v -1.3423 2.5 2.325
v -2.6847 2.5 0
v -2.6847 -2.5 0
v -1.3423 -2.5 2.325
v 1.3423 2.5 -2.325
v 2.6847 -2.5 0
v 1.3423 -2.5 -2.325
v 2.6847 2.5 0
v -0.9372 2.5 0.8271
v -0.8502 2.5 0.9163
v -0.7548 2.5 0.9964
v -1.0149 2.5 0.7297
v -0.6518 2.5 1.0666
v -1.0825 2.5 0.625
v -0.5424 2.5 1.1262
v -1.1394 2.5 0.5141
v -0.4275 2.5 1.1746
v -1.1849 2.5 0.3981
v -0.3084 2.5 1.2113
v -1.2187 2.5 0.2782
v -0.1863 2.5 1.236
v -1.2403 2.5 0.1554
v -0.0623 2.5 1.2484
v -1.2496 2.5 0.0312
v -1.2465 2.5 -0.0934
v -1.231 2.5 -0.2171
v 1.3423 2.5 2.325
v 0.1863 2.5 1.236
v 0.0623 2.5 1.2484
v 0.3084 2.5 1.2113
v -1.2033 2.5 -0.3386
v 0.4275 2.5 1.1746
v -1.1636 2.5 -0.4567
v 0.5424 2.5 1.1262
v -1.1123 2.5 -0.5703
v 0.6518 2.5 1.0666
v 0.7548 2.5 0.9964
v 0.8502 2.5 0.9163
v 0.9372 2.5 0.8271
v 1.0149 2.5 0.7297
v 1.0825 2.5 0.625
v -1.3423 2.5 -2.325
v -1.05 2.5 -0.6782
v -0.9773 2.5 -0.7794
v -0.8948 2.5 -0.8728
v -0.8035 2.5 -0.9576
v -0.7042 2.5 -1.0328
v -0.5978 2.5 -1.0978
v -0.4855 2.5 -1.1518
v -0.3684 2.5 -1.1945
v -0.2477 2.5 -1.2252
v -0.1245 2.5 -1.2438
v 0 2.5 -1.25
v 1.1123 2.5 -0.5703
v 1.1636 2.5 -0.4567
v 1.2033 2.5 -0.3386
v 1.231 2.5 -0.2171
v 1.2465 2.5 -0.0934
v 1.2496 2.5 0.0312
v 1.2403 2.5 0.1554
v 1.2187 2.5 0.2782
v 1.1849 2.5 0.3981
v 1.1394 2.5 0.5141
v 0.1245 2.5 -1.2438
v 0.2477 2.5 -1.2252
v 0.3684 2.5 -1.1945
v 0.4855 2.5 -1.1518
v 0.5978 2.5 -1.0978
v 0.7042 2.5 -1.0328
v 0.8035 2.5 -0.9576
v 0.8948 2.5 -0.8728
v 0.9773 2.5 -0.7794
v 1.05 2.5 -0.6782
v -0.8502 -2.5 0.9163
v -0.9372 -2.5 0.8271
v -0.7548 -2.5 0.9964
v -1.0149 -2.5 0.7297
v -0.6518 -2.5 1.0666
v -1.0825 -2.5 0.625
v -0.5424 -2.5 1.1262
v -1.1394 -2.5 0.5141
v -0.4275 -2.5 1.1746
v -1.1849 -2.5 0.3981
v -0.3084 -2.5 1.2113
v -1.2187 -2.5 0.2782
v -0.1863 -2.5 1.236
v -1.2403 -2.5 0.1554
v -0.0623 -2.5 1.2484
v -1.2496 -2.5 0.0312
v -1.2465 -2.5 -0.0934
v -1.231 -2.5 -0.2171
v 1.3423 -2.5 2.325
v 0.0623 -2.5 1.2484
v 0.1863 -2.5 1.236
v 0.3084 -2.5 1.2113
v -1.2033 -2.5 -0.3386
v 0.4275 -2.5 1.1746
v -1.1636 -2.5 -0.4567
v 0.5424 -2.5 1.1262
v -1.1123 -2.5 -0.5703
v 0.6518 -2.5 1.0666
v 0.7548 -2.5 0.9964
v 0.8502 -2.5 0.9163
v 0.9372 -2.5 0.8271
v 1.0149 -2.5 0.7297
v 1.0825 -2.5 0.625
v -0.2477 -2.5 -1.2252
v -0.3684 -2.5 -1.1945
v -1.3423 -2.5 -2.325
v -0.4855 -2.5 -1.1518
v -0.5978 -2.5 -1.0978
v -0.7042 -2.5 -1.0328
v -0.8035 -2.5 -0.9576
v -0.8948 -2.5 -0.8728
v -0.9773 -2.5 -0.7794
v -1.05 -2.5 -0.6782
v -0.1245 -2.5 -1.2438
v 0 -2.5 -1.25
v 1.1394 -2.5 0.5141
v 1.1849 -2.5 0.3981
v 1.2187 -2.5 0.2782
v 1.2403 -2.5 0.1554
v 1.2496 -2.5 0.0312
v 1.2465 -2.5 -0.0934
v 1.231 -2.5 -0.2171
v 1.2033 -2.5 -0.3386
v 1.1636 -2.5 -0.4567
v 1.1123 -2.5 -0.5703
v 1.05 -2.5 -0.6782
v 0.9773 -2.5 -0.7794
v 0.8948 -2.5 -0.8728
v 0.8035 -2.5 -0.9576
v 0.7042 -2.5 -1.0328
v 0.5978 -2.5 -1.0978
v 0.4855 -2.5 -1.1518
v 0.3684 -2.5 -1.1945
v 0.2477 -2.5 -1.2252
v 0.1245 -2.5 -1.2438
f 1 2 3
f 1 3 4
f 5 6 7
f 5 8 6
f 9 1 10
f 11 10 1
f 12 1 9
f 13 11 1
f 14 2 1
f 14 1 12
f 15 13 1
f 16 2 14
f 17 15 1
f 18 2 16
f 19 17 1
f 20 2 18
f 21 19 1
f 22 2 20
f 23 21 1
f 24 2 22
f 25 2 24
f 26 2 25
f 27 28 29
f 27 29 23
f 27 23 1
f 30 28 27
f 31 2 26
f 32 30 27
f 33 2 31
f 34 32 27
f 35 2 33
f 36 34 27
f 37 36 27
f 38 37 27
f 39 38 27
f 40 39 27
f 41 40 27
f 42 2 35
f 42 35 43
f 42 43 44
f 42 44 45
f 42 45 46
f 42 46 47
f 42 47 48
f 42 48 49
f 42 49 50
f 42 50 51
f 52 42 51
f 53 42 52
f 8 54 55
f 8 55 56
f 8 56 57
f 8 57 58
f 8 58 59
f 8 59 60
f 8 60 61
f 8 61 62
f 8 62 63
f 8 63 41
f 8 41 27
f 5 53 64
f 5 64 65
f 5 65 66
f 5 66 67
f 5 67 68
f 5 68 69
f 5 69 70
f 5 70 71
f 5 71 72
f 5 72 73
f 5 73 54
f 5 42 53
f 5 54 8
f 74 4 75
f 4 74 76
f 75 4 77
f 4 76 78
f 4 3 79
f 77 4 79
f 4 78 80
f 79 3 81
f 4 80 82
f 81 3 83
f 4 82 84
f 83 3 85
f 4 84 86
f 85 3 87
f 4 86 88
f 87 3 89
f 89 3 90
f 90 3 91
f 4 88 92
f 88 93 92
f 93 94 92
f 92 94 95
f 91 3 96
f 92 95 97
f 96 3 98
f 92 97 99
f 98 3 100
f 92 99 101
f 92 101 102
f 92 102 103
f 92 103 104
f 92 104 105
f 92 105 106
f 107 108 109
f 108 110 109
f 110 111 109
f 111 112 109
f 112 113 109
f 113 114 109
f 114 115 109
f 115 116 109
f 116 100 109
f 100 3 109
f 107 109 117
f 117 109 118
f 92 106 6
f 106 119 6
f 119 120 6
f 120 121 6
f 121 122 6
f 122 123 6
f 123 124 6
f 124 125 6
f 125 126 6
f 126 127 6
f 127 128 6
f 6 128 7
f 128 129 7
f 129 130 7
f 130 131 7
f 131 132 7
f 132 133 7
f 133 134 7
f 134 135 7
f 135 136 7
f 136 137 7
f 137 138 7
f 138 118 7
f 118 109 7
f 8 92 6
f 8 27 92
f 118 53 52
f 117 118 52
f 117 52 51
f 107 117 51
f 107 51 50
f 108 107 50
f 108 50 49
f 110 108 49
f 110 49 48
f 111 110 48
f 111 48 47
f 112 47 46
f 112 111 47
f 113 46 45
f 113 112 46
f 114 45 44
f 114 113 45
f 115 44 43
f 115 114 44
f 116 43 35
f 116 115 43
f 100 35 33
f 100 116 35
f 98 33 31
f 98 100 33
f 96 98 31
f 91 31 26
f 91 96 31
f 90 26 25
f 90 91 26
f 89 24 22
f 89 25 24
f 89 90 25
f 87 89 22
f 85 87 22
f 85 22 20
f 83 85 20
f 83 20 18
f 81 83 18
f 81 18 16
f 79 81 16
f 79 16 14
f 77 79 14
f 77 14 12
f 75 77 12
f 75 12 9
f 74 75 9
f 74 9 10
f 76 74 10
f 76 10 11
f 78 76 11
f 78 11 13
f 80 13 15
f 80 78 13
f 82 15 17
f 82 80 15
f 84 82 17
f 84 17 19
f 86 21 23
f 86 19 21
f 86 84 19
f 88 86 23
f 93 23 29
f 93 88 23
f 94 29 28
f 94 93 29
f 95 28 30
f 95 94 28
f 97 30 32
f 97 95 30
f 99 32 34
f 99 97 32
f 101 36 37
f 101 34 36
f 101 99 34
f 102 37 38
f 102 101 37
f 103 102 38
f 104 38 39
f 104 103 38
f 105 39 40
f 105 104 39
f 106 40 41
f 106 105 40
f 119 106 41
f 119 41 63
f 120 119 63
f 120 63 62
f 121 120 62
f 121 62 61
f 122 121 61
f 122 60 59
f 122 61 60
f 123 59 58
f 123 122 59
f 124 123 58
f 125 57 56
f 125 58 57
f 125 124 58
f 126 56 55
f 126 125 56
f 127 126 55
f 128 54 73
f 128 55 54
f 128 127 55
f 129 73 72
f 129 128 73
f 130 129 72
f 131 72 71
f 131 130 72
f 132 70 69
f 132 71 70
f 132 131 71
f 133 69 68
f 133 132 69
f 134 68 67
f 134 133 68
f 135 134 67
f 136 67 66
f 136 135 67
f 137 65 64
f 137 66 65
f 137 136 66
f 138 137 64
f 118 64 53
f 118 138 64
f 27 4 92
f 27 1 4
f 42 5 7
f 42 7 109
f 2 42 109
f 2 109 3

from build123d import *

# Parameters (mm, degrees)
EXTRUDE_1_DEPTH = 2.5


with BuildPart() as part:
    # 草图1 → 凸台-拉伸1 (new body, symmetric)
    with BuildSketch(Plane(origin=(0, 0, 0), x_dir=(1, 0, 0), z_dir=(0, 1, 0))):
        Polygon((2.684678752, 0), (1.342339376, 2.325), (-1.342339376, 2.325), (-2.684678752, 0), (-1.342339376, -2.325), (1.342339376, -2.325), align=None)
    extrude(amount=EXTRUDE_1_DEPTH, both=True)

    # 草图2 → M3 螺纹孔1 (revolve, cut)
    with BuildSketch(Plane(origin=(0, -2.5, 0), x_dir=(0, 0, -1), z_dir=(1, 0, 0))):
        Polygon((0, 0), (0, 8.251075774), (1.25, 7.5), (1.25, 0), align=None)
    hole_wizard_m3_1 = revolve(axis=Axis((0, -8.85, 0), (0, 1, 0)), mode=Mode.SUBTRACT)

    # 镜向1: M3 螺纹孔1 across plane
    add(hole_wizard_m3_1.mirror(Plane.ZX), mode=Mode.SUBTRACT)


solid = part.part
